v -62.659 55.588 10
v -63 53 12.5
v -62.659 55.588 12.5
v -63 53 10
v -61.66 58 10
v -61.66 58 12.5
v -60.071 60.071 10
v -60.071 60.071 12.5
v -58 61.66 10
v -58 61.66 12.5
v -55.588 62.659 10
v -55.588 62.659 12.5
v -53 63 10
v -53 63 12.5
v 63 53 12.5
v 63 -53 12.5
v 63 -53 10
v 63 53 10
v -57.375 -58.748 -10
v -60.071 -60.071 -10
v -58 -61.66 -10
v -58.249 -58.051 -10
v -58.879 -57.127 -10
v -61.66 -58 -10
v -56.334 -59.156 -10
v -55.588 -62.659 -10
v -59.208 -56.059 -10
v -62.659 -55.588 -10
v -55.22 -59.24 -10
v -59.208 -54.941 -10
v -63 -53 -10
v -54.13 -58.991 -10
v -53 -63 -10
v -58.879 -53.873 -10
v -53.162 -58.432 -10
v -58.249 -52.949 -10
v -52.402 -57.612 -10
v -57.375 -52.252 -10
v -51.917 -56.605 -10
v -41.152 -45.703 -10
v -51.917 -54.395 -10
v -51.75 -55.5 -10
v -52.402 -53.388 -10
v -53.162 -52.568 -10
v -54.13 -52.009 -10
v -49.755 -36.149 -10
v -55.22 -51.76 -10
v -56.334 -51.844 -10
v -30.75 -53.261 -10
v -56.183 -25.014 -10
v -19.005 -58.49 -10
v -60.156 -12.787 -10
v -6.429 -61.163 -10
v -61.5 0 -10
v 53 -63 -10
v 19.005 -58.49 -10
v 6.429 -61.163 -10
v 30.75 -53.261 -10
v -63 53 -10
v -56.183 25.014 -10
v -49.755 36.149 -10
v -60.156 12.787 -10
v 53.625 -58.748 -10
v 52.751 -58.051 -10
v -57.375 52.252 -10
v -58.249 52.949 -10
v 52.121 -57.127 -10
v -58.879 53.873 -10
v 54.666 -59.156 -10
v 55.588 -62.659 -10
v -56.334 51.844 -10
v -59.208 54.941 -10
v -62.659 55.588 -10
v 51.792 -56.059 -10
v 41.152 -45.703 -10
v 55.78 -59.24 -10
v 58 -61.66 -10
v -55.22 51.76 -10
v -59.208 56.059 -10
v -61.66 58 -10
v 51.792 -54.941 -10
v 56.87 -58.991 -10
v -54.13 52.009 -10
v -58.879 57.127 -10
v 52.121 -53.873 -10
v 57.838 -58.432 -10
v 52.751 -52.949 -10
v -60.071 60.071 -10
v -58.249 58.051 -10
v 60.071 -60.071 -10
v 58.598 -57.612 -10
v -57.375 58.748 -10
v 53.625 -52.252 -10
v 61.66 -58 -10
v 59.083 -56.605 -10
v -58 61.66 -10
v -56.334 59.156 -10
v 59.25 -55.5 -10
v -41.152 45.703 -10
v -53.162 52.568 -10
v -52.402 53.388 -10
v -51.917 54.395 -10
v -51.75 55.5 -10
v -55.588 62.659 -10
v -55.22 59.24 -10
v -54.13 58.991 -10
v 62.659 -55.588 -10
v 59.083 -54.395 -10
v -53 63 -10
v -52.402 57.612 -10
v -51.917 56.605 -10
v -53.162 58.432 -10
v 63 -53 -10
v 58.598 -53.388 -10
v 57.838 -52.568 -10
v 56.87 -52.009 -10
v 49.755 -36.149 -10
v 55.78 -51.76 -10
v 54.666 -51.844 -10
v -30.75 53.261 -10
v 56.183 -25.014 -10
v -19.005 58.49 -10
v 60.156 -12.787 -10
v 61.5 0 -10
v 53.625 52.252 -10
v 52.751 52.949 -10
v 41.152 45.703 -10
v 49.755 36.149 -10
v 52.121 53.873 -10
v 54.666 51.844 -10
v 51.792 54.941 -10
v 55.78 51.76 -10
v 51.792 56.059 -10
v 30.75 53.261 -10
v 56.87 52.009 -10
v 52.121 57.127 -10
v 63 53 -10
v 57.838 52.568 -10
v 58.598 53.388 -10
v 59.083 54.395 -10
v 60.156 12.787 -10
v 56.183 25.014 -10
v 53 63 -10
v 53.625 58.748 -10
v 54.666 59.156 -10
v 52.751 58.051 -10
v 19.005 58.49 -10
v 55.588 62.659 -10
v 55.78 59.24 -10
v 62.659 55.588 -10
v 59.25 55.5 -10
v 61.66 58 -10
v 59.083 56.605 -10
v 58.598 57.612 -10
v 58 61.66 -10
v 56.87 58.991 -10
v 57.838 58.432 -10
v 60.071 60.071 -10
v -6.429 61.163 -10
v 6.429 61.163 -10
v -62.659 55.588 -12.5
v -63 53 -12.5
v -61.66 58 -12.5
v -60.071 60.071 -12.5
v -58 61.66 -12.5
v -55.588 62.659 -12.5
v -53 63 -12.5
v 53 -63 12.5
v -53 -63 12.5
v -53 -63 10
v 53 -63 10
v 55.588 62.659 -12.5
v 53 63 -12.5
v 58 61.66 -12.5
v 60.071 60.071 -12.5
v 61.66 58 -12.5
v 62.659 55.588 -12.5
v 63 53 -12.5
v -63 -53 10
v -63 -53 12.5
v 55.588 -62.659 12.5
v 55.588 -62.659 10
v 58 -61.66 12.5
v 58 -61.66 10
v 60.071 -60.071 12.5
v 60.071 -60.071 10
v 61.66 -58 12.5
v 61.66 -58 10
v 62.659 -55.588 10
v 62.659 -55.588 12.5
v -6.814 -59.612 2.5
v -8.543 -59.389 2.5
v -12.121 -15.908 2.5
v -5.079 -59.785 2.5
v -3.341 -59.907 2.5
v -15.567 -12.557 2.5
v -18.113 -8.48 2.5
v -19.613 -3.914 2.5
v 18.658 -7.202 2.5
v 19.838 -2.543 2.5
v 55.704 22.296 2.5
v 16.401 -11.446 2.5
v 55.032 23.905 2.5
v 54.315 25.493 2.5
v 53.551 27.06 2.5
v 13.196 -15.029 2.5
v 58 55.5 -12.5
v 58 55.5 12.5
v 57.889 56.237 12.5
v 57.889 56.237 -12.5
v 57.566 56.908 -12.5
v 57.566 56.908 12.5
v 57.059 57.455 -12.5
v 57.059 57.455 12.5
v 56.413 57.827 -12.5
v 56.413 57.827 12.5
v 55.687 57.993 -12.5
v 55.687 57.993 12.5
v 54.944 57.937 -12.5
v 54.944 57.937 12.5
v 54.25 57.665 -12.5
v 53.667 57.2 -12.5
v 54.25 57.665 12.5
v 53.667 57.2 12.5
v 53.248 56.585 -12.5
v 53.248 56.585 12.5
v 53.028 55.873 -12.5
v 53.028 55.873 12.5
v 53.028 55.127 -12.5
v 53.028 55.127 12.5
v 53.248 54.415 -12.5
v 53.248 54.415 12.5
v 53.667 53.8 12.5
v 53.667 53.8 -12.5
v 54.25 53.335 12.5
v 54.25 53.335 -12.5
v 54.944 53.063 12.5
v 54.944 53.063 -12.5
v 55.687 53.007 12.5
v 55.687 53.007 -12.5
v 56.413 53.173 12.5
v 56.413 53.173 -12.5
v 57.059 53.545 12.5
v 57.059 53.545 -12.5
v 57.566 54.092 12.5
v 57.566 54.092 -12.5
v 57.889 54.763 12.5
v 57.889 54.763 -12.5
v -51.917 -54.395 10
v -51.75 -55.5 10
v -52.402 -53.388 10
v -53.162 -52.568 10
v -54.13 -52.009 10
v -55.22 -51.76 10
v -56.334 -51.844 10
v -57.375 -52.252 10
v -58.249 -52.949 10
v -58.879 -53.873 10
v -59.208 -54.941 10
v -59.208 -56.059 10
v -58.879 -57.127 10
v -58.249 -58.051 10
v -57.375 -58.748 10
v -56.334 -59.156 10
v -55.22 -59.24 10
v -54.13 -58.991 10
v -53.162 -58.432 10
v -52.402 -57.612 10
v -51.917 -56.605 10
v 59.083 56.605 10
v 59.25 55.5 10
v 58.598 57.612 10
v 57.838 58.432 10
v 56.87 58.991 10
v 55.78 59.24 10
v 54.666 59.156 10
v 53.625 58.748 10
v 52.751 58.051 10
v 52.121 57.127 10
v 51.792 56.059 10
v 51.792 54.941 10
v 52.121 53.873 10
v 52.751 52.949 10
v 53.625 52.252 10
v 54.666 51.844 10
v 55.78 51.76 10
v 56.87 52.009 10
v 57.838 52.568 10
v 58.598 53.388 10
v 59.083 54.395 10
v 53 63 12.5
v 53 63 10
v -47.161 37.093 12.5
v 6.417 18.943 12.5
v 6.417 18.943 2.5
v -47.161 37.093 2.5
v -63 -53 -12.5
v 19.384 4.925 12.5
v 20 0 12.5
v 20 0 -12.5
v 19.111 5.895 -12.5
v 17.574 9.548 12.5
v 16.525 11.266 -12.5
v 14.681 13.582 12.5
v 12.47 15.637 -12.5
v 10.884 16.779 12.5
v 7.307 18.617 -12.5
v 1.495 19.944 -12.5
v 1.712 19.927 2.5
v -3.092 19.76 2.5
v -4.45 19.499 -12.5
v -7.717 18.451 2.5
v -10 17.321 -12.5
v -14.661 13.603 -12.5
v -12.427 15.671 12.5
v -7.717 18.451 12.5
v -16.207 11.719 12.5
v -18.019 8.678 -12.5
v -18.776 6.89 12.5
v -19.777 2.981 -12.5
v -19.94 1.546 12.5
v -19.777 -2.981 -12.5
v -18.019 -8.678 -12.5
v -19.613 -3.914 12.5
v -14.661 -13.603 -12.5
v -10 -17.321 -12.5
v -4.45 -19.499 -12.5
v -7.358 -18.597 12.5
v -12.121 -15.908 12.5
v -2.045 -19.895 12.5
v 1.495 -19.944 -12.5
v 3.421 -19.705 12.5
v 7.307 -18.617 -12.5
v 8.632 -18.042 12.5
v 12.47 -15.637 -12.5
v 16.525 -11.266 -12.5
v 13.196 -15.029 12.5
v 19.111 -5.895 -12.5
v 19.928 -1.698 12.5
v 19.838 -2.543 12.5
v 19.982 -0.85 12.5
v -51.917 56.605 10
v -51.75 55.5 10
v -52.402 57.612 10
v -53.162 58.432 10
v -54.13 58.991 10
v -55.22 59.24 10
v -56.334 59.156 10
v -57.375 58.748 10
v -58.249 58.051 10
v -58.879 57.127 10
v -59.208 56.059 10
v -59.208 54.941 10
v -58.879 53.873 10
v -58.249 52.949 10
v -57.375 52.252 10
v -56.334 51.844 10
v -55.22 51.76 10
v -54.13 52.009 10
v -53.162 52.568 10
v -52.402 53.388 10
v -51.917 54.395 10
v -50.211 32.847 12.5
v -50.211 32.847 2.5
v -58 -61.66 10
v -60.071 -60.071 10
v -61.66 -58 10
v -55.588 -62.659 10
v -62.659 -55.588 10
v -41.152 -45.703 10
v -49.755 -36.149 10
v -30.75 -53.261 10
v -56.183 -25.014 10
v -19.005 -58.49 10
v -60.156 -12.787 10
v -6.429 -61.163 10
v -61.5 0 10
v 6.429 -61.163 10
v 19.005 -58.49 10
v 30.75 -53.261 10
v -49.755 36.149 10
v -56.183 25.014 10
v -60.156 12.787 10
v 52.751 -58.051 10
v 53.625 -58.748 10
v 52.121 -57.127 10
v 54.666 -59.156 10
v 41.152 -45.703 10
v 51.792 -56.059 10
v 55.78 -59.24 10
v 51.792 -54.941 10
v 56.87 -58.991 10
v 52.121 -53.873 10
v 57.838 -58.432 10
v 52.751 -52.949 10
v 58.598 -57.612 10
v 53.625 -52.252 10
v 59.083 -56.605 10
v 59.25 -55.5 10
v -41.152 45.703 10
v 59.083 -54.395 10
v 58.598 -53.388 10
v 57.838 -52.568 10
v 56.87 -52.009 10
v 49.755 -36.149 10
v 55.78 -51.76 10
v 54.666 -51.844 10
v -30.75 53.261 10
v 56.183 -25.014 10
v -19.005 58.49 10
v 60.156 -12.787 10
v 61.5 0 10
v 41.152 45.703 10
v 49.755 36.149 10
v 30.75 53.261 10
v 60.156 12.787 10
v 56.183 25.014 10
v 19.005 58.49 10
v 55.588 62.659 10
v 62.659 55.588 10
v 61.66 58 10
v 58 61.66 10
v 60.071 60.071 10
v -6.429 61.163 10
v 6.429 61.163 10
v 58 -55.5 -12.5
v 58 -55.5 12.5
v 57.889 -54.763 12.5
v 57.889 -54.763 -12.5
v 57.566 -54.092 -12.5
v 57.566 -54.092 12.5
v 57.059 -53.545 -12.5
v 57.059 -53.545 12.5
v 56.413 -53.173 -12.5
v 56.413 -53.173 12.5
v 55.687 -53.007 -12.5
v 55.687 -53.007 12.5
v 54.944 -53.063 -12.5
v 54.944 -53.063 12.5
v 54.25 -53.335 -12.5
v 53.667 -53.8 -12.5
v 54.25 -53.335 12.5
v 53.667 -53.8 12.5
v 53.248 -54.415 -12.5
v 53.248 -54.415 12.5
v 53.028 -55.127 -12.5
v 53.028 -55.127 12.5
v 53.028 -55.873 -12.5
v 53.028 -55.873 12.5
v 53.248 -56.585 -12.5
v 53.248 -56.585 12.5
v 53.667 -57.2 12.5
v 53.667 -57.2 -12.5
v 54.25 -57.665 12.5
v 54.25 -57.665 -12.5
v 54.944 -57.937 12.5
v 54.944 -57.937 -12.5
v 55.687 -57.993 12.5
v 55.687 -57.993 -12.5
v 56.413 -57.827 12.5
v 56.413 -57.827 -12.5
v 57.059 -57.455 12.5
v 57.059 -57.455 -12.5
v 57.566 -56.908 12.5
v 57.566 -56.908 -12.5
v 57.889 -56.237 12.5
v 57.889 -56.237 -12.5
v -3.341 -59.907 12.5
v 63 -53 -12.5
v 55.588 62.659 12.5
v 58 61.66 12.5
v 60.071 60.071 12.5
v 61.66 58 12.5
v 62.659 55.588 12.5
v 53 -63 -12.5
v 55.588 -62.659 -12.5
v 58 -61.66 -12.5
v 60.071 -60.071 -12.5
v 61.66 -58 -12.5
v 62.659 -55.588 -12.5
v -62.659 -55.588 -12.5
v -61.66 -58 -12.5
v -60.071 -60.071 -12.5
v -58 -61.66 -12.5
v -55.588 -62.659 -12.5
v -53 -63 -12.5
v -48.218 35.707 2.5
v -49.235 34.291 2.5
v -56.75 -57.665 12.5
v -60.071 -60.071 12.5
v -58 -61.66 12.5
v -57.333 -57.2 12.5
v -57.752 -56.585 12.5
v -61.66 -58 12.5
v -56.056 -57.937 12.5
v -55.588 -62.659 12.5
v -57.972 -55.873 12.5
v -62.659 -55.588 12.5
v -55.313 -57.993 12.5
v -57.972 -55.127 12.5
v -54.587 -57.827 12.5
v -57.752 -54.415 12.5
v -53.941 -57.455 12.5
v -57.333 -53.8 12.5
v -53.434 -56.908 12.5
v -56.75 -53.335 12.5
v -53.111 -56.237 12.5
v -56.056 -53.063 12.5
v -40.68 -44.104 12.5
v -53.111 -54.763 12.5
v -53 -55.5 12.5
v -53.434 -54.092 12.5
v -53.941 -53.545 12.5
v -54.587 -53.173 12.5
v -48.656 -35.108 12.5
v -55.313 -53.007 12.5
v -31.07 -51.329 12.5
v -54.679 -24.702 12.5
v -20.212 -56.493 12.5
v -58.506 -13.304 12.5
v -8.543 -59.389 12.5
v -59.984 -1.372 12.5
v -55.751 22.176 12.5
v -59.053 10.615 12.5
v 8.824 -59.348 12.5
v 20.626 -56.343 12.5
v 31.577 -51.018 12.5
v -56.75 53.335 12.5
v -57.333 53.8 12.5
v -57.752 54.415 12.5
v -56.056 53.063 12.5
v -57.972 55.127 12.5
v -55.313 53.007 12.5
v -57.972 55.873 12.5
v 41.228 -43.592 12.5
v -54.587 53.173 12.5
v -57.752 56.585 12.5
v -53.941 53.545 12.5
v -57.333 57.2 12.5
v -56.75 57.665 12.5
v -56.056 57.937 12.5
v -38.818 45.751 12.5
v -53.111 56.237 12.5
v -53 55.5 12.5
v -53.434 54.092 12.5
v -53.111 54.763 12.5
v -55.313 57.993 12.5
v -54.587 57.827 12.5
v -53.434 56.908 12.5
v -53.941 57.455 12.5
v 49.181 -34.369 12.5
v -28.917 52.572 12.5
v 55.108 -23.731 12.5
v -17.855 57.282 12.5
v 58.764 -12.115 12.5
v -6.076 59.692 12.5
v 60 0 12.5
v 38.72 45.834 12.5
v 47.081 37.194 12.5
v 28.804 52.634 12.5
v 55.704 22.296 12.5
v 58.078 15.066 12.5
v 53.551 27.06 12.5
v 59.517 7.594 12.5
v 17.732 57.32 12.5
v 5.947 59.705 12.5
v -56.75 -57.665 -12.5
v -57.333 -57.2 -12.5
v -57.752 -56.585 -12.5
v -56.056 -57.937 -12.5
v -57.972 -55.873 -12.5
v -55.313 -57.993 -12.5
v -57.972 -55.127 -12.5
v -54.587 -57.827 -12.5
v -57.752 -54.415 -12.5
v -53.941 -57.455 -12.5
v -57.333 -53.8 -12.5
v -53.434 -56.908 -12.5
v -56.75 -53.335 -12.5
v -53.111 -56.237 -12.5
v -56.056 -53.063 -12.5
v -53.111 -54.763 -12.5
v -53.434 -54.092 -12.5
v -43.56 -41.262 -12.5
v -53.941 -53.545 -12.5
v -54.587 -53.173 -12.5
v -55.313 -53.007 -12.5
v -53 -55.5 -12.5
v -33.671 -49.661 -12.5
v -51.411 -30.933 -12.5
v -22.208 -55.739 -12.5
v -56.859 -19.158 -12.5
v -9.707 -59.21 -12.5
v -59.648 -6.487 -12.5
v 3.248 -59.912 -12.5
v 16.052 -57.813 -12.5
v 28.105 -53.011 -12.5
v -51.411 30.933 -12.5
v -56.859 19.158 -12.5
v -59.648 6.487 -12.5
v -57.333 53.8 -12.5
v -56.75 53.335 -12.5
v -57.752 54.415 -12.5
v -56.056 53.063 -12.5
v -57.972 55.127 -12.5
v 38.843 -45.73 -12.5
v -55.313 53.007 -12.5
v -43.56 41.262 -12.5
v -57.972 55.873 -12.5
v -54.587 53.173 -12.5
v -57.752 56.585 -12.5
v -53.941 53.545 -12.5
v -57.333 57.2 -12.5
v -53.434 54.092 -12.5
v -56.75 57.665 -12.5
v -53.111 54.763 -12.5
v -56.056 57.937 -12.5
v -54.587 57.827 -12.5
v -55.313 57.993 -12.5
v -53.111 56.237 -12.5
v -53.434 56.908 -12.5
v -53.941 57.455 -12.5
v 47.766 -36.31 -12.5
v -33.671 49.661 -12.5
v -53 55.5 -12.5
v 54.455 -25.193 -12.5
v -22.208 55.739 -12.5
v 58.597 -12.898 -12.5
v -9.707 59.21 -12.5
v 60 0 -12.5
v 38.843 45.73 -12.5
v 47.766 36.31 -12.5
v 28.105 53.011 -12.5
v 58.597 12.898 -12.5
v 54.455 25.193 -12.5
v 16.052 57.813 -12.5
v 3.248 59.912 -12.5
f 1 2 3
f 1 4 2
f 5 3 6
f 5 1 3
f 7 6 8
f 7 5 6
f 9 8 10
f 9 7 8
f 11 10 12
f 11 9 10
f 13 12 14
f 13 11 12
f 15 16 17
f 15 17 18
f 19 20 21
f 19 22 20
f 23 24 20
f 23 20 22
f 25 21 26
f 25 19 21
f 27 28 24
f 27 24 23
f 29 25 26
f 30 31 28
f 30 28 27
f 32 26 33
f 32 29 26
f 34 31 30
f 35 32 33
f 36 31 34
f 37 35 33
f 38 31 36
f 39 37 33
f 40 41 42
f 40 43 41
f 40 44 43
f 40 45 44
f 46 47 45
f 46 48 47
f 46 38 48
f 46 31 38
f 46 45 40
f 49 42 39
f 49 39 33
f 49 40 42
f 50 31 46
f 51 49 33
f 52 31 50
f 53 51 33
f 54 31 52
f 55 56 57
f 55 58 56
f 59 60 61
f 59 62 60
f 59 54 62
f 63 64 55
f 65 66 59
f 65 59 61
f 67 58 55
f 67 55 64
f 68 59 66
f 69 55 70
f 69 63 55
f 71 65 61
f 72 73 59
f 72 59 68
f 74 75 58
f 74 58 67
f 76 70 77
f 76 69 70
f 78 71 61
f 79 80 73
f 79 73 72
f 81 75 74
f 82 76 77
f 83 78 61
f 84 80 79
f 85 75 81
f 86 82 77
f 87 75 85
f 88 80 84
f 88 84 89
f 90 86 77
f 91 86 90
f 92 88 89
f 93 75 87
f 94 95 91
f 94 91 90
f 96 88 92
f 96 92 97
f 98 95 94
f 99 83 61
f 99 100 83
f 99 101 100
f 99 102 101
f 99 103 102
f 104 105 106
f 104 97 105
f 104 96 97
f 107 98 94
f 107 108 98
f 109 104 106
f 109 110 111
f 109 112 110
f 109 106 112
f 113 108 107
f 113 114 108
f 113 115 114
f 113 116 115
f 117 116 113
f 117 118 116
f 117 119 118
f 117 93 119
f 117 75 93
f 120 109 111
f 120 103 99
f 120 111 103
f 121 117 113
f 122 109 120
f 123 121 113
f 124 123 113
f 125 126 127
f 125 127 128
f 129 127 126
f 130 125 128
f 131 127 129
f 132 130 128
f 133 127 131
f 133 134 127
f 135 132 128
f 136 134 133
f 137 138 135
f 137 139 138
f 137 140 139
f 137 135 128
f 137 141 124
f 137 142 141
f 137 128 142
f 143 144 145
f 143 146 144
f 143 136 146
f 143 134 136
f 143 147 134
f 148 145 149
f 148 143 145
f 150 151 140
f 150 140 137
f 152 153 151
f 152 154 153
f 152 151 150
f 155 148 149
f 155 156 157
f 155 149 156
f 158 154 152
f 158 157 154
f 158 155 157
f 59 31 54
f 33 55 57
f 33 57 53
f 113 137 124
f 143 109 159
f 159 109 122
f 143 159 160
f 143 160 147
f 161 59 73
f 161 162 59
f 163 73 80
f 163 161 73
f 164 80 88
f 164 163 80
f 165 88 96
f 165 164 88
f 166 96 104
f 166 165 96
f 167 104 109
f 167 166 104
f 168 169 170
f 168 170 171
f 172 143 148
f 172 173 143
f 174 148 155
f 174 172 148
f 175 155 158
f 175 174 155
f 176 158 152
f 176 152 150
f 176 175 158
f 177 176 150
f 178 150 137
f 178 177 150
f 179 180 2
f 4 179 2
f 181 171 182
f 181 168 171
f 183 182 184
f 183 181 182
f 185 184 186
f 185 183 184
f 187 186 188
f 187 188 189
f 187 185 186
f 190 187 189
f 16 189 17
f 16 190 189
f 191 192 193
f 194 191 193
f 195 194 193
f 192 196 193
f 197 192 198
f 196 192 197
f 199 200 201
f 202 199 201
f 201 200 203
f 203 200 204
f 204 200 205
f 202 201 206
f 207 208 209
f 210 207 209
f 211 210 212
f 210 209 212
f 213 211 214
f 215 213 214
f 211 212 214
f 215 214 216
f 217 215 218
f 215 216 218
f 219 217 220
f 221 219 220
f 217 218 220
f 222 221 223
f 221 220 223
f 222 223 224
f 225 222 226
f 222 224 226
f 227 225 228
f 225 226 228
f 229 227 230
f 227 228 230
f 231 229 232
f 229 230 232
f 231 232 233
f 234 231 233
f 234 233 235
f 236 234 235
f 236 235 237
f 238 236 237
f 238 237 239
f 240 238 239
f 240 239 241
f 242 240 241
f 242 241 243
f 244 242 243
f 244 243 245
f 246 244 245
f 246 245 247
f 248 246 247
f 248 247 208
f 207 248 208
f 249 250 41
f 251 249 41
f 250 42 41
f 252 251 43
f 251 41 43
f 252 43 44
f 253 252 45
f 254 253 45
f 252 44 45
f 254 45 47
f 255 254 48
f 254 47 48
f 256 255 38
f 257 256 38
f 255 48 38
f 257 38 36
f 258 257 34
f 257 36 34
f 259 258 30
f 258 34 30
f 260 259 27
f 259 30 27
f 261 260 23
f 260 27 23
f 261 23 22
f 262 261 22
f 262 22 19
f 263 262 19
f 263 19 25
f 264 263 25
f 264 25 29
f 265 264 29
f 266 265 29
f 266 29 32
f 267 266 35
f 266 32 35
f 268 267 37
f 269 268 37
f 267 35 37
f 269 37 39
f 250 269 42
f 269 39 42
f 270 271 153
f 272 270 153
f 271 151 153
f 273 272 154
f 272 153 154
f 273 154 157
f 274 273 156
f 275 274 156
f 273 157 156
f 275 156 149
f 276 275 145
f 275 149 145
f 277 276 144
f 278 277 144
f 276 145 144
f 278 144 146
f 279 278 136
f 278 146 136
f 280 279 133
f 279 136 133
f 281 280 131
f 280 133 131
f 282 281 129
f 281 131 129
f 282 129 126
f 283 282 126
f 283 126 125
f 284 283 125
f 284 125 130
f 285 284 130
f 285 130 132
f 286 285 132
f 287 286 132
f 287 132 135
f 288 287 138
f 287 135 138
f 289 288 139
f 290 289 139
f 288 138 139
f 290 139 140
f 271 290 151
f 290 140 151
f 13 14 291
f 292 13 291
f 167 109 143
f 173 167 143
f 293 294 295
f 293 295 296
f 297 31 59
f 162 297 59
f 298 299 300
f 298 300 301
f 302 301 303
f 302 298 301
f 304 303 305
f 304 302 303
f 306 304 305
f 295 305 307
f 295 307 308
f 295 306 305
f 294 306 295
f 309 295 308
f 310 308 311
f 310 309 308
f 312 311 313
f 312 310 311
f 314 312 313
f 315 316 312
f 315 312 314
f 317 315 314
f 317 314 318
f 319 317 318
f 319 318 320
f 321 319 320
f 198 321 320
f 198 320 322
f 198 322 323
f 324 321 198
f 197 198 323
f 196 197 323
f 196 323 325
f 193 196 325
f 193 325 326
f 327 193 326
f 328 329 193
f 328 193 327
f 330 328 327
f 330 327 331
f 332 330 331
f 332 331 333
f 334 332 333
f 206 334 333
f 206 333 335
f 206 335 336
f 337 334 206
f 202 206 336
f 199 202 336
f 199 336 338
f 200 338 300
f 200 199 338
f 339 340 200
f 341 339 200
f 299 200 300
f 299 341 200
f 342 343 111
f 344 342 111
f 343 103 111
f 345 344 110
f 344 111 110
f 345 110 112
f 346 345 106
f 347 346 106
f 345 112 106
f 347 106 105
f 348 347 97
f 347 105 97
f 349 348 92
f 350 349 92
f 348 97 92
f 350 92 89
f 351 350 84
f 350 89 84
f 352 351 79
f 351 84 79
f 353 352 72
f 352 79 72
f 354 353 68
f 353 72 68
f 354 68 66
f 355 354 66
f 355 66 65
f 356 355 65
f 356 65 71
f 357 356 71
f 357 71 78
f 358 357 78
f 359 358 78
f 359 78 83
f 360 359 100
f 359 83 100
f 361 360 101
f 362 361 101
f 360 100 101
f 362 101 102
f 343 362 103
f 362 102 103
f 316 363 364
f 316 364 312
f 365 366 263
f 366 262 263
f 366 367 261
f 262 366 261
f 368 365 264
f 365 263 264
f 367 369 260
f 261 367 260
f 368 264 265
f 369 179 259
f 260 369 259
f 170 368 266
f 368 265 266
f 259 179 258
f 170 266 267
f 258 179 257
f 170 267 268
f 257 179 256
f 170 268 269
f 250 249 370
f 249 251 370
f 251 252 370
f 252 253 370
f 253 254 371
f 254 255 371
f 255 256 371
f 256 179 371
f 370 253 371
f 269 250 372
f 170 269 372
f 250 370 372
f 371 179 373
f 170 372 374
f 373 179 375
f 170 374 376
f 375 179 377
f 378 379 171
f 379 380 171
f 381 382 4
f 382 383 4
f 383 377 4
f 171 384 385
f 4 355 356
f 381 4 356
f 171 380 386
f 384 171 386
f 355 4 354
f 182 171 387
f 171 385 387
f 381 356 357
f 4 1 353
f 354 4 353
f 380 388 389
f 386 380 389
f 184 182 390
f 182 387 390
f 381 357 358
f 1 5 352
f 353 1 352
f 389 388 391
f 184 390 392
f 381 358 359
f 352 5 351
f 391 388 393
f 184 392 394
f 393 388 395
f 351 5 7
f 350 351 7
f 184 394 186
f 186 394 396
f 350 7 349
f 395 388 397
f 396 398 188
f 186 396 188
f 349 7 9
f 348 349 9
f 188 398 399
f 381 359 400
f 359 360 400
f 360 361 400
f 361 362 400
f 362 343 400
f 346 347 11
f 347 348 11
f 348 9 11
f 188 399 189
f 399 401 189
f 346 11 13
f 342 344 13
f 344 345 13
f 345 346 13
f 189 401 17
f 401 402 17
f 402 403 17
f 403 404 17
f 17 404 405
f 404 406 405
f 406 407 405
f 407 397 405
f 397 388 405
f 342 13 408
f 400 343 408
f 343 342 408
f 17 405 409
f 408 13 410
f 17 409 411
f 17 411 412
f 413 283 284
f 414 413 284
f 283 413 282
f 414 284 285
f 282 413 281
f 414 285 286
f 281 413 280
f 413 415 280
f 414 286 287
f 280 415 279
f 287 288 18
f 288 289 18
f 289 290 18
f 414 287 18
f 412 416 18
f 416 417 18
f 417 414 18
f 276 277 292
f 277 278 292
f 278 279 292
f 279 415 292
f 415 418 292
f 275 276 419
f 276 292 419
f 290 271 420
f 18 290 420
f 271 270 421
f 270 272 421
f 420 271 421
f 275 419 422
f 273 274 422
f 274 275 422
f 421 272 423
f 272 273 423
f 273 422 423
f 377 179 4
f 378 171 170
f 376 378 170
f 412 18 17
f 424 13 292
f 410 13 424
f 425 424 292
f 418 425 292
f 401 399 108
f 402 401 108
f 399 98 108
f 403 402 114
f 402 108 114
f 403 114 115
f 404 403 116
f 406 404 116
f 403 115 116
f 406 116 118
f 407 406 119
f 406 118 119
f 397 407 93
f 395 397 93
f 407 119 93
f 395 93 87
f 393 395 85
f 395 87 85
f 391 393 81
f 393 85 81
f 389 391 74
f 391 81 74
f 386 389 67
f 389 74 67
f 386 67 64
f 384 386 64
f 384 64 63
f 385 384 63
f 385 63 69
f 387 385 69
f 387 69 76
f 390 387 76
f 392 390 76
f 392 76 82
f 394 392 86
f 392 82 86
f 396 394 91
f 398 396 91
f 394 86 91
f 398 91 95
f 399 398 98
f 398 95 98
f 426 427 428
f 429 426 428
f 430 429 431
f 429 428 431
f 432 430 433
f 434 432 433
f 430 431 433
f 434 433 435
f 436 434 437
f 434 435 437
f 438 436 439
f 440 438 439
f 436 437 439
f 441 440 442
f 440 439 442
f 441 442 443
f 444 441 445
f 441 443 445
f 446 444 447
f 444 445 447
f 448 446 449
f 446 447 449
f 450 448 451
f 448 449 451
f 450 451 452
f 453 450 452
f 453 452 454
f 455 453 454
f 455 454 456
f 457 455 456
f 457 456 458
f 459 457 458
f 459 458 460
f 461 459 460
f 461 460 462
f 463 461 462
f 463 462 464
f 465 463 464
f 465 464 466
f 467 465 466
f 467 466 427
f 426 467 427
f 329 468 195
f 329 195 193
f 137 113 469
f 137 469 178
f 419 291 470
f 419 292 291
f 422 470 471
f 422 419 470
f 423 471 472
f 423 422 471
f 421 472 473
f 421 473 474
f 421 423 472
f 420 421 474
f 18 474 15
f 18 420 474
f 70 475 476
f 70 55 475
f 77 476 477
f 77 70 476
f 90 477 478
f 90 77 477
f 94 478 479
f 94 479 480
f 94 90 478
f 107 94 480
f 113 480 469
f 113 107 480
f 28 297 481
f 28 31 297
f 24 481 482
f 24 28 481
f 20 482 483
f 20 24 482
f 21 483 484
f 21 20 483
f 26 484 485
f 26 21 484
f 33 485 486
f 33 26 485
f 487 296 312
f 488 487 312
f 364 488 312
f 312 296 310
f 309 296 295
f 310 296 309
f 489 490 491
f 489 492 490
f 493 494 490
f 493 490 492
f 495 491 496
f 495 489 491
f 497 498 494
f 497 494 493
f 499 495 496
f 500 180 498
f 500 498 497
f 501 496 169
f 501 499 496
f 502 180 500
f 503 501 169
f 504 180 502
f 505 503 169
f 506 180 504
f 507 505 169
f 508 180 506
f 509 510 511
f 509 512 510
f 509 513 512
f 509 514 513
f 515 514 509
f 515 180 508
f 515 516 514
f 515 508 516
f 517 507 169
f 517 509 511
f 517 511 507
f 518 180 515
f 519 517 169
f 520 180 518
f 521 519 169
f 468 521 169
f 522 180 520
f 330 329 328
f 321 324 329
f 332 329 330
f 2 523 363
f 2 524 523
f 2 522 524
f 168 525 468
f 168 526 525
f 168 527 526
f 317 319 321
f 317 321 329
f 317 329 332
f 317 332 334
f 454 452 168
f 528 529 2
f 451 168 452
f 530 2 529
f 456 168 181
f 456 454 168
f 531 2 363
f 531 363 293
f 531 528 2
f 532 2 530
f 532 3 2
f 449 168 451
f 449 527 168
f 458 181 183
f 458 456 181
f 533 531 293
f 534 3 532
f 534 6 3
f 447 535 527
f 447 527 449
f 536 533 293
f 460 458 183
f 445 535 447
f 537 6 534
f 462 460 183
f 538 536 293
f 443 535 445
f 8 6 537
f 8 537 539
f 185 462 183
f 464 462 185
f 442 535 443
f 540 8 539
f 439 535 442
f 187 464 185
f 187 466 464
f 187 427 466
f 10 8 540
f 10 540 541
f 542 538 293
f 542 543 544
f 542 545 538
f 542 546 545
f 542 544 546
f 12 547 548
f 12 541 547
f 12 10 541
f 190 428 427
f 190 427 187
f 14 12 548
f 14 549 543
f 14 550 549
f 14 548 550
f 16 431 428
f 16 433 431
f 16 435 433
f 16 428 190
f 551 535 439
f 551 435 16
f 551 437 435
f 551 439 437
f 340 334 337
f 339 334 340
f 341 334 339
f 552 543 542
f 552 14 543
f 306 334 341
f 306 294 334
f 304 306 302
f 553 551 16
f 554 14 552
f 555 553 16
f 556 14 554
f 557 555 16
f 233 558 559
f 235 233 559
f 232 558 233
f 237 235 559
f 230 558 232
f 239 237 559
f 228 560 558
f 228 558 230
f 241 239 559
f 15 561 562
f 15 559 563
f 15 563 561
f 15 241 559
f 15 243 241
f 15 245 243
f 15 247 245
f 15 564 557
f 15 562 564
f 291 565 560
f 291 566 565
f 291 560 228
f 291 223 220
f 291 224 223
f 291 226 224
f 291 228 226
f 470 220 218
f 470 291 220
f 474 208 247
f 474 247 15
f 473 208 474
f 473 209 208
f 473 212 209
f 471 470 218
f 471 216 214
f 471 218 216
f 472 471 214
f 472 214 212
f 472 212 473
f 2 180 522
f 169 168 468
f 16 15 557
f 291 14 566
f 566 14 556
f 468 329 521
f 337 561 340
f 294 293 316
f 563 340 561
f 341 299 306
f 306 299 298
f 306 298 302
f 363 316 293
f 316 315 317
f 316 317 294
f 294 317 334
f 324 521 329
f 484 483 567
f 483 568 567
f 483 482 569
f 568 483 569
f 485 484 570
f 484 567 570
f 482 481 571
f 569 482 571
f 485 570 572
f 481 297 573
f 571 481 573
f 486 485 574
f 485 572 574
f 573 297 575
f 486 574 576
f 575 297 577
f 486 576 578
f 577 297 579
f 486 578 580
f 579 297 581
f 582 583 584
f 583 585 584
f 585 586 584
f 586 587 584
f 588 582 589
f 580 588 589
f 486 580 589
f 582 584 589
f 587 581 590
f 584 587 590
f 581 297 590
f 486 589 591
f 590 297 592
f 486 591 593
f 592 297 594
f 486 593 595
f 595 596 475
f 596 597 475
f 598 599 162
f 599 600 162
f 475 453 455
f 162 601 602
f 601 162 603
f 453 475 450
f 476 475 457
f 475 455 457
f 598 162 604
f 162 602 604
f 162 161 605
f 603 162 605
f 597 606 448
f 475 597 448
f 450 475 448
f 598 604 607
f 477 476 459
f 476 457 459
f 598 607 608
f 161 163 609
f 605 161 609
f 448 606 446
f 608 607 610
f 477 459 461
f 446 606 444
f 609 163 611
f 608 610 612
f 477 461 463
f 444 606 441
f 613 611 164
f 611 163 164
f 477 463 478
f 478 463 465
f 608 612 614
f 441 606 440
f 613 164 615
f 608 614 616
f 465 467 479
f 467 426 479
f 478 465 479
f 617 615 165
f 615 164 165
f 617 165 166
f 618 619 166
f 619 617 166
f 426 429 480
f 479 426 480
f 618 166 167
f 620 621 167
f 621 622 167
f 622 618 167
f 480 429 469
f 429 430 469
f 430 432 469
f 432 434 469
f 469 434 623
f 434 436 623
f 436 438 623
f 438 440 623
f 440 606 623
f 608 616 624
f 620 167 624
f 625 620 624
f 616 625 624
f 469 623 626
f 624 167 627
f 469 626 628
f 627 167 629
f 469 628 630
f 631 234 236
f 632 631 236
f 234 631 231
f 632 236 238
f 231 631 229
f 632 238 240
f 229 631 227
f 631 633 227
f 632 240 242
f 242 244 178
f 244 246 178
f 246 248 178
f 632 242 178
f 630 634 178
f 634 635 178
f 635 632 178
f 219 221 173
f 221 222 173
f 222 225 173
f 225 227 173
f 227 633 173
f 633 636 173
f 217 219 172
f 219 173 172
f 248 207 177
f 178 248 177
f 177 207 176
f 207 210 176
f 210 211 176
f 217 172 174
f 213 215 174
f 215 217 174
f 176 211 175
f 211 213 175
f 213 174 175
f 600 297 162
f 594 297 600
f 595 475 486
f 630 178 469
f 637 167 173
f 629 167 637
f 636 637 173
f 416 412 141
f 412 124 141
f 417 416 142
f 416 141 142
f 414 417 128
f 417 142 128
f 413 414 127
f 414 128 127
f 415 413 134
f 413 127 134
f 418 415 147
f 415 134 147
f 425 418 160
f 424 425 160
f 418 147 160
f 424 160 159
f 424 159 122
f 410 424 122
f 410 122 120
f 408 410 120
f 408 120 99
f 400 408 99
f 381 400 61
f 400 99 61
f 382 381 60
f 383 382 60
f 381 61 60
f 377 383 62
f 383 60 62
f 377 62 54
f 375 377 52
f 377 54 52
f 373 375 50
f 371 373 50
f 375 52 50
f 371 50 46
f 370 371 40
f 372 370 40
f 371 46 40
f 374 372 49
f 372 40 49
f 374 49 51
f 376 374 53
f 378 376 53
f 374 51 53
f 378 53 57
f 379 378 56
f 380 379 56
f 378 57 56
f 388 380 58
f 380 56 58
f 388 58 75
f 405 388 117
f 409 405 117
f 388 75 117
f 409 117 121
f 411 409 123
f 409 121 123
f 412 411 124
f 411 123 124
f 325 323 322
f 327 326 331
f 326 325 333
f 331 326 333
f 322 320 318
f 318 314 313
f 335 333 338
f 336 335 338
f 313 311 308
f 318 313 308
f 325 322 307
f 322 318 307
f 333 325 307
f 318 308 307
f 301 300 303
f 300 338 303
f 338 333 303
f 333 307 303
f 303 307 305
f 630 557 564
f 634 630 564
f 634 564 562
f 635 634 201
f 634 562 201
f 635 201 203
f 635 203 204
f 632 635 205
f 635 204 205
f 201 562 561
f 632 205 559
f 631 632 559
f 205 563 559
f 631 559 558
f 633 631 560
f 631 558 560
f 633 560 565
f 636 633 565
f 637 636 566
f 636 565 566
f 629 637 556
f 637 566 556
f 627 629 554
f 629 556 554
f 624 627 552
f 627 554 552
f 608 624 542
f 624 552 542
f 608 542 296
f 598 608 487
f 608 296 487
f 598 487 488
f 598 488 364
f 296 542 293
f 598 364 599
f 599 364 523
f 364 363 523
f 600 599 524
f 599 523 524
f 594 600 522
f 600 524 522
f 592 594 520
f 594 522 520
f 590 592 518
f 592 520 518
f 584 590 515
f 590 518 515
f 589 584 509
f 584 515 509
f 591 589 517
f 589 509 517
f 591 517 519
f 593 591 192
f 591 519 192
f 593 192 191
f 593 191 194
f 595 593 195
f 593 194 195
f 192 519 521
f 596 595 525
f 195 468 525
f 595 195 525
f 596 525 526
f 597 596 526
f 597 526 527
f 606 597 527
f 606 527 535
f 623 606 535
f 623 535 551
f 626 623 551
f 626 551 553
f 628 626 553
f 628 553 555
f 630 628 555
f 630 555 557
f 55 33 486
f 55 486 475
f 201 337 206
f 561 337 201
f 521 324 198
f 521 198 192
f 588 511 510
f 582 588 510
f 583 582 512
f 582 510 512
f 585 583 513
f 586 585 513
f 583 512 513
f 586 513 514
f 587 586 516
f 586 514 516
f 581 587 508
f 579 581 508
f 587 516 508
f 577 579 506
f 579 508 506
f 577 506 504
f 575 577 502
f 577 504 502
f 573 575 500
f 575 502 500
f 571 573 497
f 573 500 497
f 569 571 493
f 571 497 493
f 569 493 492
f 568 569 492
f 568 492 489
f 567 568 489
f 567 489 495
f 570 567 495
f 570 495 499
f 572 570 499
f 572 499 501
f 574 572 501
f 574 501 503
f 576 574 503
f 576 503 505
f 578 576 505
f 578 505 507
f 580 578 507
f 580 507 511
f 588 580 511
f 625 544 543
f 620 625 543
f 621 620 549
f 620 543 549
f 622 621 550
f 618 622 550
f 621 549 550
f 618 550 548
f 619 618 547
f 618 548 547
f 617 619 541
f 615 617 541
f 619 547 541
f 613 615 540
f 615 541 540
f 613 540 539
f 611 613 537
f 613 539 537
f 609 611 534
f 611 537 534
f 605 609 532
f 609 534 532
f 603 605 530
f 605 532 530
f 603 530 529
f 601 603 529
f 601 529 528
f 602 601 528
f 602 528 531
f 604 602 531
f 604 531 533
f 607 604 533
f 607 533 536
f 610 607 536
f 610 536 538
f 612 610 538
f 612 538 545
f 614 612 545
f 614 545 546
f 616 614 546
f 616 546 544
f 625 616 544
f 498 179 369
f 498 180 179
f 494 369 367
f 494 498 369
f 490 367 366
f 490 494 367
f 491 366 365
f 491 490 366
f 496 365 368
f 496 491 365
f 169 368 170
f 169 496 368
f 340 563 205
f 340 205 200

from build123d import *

# Parameters (mm, degrees)
F0_W     = 126
F0_H     = 126
F1_DEPTH = 12.5
F6_R     = 60
F6_R_2   = 20
F6_R_3   = 2.5
F7_DEPTH = 25.001
F3_DEPTH = 10
F4_W     = 126
F4_H     = 126
F4_R     = 3.75
F4_R_2   = 61.5
F8_DEPTH = 10
F5_R     = 10


with BuildPart() as f1:
    # F0 (on Top) → F1 (new body, symmetric)
    with BuildSketch(Plane.XY):
        Rectangle(F0_W, F0_H)
    extrude(amount=F1_DEPTH, both=True)

    # F6 (on face) → F7 (cut, through all)
    with BuildSketch(Plane.XY.offset(12.5)):
        Circle(F6_R)
        Circle(F6_R_2, mode=Mode.SUBTRACT)
        with Locations((55.5, -55.5)):
            Circle(F6_R_3)
        with Locations((-55.5, -55.5)):
            Circle(F6_R_3)
        with Locations((-55.5, 55.5)):
            Circle(F6_R_3)
        with Locations((55.5, 55.5)):
            Circle(F6_R_3)
    extrude(amount=-F7_DEPTH, mode=Mode.SUBTRACT)

    # F2 (on face) → F3 (join)
    with BuildSketch(Plane.XY.offset(12.5)):
        with BuildLine():
            Line((6.416974, 18.942609), (-47.160816, 37.092552))
            ThreePointArc((-47.160816, 37.092552), (-48.731962, 35.002798), (-50.210577, 32.846582))
            Line((-50.210577, 32.846582), (-7.716628, 18.451386))
            ThreePointArc((-7.716628, 18.451386), (-0.694694, 19.987931), (6.416974, 18.942609))
        make_face()
        with BuildLine():
            ThreePointArc((-8.542685, -59.388741), (-5.947332, -59.704516), (-3.340686, -59.906926))
            Line((-3.340686, -59.906926), (-12.121055, -15.908489))
            ThreePointArc((-12.121055, -15.908489), (-16.962709, -10.595589), (-19.613268, -3.914042))
            Line((-19.613268, -3.914042), (-8.542685, -59.388741))
        make_face()
        with BuildLine():
            ThreePointArc((55.703501, 22.296188), (54.679293, 24.701718), (53.551263, 27.060344))
            Line((53.551263, 27.060344), (19.837683, -2.542897))
            ThreePointArc((19.837683, -2.542897), (17.657403, -9.392343), (13.196294, -15.028567))
            Line((13.196294, -15.028567), (55.703501, 22.296188))
        make_face()
    extrude(amount=-F3_DEPTH)

    # F4 (on Top) → F8 (cut, symmetric)
    with BuildSketch(Plane.XY):
        Rectangle(F4_W, F4_H)
        with Locations((-55.5, -55.5)):
            Circle(F4_R, mode=Mode.SUBTRACT)
        with Locations((55.5, -55.5)):
            Circle(F4_R, mode=Mode.SUBTRACT)
        with Locations((-55.5, 55.5)):
            Circle(F4_R, mode=Mode.SUBTRACT)
        Circle(F4_R_2, mode=Mode.SUBTRACT)
        with Locations((55.5, 55.5)):
            Circle(F4_R, mode=Mode.SUBTRACT)
    extrude(amount=F8_DEPTH, both=True, mode=Mode.SUBTRACT)

    # F5
    f5_edges = [f1.edges().sort_by_distance(p)[0] for p in [
        (63, 63, -11.25),
        (63, 63, 11.25),
        (-63, 63, -11.25),
        (-63, 63, 11.25),
        (-63, -63, -11.25),
        (-63, -63, 11.25),
        (63, -63, -11.25),
        (63, -63, 11.25),
    ]]
    fillet(f5_edges, radius=F5_R)


solid = f1.part
